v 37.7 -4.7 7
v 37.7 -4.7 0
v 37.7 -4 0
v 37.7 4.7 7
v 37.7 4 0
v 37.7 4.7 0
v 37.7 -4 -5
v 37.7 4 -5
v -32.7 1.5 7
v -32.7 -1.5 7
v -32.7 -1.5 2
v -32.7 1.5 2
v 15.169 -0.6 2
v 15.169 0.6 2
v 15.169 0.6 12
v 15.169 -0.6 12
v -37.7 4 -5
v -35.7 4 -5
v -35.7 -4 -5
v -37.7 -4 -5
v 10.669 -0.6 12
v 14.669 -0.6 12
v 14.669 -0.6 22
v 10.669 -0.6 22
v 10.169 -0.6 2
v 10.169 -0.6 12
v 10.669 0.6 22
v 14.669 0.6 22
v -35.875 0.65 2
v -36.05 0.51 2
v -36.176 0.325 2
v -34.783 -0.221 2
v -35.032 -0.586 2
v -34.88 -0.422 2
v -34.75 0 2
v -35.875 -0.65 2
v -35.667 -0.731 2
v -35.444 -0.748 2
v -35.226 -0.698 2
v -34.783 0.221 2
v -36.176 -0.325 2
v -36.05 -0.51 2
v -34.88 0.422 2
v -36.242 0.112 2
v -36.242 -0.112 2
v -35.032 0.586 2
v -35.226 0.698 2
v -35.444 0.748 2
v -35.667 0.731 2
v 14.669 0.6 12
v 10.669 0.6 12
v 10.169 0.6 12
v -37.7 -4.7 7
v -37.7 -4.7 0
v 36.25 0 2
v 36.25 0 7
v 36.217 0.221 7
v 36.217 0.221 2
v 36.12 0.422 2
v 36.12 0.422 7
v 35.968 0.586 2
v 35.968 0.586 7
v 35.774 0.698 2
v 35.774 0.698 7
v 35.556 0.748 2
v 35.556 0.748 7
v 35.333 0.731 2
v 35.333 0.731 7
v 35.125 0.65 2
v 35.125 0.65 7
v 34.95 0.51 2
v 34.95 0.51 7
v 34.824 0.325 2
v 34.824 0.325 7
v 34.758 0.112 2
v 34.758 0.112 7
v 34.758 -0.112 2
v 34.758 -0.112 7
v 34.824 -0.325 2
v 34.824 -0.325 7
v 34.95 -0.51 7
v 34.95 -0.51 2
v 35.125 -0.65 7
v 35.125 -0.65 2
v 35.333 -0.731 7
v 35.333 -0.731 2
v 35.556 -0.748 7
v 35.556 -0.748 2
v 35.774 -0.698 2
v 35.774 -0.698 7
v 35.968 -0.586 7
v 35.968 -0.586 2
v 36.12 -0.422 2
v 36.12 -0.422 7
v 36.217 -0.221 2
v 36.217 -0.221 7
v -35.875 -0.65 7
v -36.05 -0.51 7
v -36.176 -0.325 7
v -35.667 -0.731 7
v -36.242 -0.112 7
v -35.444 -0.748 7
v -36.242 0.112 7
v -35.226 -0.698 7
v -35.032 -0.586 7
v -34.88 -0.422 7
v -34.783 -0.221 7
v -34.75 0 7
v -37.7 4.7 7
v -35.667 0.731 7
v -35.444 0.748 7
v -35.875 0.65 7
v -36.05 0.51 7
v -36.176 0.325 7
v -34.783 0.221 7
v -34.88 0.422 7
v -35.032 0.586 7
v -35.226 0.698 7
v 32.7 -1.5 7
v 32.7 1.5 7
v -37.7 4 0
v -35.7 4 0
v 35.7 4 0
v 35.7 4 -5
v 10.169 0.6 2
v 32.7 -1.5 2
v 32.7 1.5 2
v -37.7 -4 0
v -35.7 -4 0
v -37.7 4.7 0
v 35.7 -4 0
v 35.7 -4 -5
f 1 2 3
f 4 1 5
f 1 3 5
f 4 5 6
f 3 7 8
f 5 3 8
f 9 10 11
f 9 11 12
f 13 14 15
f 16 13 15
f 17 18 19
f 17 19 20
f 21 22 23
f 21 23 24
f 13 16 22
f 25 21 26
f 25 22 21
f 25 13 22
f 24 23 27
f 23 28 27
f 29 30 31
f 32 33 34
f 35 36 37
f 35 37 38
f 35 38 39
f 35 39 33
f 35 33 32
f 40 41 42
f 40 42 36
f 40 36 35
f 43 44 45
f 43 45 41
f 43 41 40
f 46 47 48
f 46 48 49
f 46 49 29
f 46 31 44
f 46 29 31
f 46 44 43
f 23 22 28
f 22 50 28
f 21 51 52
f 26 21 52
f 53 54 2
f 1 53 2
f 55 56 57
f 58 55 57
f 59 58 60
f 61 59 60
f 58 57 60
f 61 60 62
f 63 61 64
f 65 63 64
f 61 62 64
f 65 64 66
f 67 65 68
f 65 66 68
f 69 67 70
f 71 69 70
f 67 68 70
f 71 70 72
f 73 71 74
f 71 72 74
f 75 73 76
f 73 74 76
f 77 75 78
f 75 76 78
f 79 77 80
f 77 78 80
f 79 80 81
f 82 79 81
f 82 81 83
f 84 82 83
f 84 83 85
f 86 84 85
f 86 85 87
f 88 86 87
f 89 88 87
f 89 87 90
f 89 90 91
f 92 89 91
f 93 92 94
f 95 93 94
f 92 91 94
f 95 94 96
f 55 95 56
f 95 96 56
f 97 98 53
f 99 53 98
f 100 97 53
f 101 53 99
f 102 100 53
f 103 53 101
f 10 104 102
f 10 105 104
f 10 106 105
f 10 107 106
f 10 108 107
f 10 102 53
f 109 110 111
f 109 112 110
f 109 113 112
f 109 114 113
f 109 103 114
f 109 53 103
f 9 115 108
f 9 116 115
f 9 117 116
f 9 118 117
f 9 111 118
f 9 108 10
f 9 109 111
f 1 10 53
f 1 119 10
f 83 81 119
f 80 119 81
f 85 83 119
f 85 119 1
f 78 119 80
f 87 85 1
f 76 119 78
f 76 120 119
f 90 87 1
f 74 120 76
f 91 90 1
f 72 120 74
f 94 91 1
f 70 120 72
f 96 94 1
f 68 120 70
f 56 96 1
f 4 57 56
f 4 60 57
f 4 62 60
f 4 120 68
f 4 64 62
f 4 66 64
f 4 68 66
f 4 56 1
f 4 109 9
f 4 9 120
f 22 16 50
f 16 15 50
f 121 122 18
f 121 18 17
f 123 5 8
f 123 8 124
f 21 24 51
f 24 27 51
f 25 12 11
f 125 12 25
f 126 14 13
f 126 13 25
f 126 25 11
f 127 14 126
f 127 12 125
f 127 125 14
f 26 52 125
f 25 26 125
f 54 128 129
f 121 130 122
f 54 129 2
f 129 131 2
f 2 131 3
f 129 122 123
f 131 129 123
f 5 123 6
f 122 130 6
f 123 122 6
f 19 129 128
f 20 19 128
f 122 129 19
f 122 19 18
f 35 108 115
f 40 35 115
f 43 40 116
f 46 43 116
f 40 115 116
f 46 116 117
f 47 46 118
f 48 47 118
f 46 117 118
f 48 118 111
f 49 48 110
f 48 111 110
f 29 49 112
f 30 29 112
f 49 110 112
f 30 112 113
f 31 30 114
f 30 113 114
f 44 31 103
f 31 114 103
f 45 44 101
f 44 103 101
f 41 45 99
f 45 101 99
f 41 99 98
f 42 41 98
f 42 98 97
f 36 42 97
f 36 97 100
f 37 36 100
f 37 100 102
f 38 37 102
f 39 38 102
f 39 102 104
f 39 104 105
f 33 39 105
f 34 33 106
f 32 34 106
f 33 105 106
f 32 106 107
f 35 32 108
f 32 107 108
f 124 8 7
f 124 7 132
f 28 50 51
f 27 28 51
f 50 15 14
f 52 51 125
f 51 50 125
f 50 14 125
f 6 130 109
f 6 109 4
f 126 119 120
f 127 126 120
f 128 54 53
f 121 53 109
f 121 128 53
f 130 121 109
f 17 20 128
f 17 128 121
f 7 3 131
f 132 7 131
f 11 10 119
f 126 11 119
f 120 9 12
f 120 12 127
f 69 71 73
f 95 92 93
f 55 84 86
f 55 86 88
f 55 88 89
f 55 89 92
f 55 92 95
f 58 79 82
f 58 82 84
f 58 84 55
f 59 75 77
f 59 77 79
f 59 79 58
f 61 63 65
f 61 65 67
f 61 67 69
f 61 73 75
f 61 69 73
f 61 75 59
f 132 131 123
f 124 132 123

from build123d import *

# Parameters (mm, degrees)
SKETCH1_W           = 75.4
SKETCH1_H           = 9.4
BOSS_EXTRUDE1_DEPTH = 7
SKETCH2_R           = 0.75
SKETCH2_W           = 65.4
SKETCH2_H           = 3
CUT_EXTRUDE1_DEPTH  = 5
SKETCH3_W           = 2
SKETCH3_H           = 8
BOSS_EXTRUDE2_DEPTH = 5
BOSS_EXTRUDE3_DEPTH = 0.6


with BuildPart() as part:
    # Sketch1 → Boss-Extrude1 (new body)
    with BuildSketch(Plane.XY):
        Rectangle(SKETCH1_W, SKETCH1_H)
    extrude(amount=BOSS_EXTRUDE1_DEPTH)

    # Sketch2 → Cut-Extrude1 (cut)
    with BuildSketch(Plane.XY.offset(7)):
        with Locations((-35.5, 0)):
            Circle(SKETCH2_R)
        with Locations((35.5, 0)):
            Circle(SKETCH2_R)
        Rectangle(SKETCH2_W, SKETCH2_H)
    extrude(amount=-CUT_EXTRUDE1_DEPTH, mode=Mode.SUBTRACT)

    # Sketch3 → Boss-Extrude2 (add)
    with BuildSketch(Plane(origin=(0, 0, 0), x_dir=(-1, 0, 0), z_dir=(0, 0, -1))):
        with Locations((-36.7, 0)):
            Rectangle(SKETCH3_W, SKETCH3_H)
        with Locations((36.7, 0)):
            Rectangle(SKETCH3_W, SKETCH3_H)
    extrude(amount=BOSS_EXTRUDE2_DEPTH)

    # Sketch4 → Boss-Extrude3 (add, symmetric)
    with BuildSketch(Plane(origin=(0, 0, 0), x_dir=(1, 0, 0), z_dir=(0, 1, 0))):
        Polygon((10.169323516, 0), (15.169323516, 0), (15.169323516, -12), (14.669323516, -12), (14.669323516, -22), (10.669323516, -22), (10.669323516, -12), (10.169323516, -12), align=None)
    extrude(amount=BOSS_EXTRUDE3_DEPTH, both=True)


solid = part.part
